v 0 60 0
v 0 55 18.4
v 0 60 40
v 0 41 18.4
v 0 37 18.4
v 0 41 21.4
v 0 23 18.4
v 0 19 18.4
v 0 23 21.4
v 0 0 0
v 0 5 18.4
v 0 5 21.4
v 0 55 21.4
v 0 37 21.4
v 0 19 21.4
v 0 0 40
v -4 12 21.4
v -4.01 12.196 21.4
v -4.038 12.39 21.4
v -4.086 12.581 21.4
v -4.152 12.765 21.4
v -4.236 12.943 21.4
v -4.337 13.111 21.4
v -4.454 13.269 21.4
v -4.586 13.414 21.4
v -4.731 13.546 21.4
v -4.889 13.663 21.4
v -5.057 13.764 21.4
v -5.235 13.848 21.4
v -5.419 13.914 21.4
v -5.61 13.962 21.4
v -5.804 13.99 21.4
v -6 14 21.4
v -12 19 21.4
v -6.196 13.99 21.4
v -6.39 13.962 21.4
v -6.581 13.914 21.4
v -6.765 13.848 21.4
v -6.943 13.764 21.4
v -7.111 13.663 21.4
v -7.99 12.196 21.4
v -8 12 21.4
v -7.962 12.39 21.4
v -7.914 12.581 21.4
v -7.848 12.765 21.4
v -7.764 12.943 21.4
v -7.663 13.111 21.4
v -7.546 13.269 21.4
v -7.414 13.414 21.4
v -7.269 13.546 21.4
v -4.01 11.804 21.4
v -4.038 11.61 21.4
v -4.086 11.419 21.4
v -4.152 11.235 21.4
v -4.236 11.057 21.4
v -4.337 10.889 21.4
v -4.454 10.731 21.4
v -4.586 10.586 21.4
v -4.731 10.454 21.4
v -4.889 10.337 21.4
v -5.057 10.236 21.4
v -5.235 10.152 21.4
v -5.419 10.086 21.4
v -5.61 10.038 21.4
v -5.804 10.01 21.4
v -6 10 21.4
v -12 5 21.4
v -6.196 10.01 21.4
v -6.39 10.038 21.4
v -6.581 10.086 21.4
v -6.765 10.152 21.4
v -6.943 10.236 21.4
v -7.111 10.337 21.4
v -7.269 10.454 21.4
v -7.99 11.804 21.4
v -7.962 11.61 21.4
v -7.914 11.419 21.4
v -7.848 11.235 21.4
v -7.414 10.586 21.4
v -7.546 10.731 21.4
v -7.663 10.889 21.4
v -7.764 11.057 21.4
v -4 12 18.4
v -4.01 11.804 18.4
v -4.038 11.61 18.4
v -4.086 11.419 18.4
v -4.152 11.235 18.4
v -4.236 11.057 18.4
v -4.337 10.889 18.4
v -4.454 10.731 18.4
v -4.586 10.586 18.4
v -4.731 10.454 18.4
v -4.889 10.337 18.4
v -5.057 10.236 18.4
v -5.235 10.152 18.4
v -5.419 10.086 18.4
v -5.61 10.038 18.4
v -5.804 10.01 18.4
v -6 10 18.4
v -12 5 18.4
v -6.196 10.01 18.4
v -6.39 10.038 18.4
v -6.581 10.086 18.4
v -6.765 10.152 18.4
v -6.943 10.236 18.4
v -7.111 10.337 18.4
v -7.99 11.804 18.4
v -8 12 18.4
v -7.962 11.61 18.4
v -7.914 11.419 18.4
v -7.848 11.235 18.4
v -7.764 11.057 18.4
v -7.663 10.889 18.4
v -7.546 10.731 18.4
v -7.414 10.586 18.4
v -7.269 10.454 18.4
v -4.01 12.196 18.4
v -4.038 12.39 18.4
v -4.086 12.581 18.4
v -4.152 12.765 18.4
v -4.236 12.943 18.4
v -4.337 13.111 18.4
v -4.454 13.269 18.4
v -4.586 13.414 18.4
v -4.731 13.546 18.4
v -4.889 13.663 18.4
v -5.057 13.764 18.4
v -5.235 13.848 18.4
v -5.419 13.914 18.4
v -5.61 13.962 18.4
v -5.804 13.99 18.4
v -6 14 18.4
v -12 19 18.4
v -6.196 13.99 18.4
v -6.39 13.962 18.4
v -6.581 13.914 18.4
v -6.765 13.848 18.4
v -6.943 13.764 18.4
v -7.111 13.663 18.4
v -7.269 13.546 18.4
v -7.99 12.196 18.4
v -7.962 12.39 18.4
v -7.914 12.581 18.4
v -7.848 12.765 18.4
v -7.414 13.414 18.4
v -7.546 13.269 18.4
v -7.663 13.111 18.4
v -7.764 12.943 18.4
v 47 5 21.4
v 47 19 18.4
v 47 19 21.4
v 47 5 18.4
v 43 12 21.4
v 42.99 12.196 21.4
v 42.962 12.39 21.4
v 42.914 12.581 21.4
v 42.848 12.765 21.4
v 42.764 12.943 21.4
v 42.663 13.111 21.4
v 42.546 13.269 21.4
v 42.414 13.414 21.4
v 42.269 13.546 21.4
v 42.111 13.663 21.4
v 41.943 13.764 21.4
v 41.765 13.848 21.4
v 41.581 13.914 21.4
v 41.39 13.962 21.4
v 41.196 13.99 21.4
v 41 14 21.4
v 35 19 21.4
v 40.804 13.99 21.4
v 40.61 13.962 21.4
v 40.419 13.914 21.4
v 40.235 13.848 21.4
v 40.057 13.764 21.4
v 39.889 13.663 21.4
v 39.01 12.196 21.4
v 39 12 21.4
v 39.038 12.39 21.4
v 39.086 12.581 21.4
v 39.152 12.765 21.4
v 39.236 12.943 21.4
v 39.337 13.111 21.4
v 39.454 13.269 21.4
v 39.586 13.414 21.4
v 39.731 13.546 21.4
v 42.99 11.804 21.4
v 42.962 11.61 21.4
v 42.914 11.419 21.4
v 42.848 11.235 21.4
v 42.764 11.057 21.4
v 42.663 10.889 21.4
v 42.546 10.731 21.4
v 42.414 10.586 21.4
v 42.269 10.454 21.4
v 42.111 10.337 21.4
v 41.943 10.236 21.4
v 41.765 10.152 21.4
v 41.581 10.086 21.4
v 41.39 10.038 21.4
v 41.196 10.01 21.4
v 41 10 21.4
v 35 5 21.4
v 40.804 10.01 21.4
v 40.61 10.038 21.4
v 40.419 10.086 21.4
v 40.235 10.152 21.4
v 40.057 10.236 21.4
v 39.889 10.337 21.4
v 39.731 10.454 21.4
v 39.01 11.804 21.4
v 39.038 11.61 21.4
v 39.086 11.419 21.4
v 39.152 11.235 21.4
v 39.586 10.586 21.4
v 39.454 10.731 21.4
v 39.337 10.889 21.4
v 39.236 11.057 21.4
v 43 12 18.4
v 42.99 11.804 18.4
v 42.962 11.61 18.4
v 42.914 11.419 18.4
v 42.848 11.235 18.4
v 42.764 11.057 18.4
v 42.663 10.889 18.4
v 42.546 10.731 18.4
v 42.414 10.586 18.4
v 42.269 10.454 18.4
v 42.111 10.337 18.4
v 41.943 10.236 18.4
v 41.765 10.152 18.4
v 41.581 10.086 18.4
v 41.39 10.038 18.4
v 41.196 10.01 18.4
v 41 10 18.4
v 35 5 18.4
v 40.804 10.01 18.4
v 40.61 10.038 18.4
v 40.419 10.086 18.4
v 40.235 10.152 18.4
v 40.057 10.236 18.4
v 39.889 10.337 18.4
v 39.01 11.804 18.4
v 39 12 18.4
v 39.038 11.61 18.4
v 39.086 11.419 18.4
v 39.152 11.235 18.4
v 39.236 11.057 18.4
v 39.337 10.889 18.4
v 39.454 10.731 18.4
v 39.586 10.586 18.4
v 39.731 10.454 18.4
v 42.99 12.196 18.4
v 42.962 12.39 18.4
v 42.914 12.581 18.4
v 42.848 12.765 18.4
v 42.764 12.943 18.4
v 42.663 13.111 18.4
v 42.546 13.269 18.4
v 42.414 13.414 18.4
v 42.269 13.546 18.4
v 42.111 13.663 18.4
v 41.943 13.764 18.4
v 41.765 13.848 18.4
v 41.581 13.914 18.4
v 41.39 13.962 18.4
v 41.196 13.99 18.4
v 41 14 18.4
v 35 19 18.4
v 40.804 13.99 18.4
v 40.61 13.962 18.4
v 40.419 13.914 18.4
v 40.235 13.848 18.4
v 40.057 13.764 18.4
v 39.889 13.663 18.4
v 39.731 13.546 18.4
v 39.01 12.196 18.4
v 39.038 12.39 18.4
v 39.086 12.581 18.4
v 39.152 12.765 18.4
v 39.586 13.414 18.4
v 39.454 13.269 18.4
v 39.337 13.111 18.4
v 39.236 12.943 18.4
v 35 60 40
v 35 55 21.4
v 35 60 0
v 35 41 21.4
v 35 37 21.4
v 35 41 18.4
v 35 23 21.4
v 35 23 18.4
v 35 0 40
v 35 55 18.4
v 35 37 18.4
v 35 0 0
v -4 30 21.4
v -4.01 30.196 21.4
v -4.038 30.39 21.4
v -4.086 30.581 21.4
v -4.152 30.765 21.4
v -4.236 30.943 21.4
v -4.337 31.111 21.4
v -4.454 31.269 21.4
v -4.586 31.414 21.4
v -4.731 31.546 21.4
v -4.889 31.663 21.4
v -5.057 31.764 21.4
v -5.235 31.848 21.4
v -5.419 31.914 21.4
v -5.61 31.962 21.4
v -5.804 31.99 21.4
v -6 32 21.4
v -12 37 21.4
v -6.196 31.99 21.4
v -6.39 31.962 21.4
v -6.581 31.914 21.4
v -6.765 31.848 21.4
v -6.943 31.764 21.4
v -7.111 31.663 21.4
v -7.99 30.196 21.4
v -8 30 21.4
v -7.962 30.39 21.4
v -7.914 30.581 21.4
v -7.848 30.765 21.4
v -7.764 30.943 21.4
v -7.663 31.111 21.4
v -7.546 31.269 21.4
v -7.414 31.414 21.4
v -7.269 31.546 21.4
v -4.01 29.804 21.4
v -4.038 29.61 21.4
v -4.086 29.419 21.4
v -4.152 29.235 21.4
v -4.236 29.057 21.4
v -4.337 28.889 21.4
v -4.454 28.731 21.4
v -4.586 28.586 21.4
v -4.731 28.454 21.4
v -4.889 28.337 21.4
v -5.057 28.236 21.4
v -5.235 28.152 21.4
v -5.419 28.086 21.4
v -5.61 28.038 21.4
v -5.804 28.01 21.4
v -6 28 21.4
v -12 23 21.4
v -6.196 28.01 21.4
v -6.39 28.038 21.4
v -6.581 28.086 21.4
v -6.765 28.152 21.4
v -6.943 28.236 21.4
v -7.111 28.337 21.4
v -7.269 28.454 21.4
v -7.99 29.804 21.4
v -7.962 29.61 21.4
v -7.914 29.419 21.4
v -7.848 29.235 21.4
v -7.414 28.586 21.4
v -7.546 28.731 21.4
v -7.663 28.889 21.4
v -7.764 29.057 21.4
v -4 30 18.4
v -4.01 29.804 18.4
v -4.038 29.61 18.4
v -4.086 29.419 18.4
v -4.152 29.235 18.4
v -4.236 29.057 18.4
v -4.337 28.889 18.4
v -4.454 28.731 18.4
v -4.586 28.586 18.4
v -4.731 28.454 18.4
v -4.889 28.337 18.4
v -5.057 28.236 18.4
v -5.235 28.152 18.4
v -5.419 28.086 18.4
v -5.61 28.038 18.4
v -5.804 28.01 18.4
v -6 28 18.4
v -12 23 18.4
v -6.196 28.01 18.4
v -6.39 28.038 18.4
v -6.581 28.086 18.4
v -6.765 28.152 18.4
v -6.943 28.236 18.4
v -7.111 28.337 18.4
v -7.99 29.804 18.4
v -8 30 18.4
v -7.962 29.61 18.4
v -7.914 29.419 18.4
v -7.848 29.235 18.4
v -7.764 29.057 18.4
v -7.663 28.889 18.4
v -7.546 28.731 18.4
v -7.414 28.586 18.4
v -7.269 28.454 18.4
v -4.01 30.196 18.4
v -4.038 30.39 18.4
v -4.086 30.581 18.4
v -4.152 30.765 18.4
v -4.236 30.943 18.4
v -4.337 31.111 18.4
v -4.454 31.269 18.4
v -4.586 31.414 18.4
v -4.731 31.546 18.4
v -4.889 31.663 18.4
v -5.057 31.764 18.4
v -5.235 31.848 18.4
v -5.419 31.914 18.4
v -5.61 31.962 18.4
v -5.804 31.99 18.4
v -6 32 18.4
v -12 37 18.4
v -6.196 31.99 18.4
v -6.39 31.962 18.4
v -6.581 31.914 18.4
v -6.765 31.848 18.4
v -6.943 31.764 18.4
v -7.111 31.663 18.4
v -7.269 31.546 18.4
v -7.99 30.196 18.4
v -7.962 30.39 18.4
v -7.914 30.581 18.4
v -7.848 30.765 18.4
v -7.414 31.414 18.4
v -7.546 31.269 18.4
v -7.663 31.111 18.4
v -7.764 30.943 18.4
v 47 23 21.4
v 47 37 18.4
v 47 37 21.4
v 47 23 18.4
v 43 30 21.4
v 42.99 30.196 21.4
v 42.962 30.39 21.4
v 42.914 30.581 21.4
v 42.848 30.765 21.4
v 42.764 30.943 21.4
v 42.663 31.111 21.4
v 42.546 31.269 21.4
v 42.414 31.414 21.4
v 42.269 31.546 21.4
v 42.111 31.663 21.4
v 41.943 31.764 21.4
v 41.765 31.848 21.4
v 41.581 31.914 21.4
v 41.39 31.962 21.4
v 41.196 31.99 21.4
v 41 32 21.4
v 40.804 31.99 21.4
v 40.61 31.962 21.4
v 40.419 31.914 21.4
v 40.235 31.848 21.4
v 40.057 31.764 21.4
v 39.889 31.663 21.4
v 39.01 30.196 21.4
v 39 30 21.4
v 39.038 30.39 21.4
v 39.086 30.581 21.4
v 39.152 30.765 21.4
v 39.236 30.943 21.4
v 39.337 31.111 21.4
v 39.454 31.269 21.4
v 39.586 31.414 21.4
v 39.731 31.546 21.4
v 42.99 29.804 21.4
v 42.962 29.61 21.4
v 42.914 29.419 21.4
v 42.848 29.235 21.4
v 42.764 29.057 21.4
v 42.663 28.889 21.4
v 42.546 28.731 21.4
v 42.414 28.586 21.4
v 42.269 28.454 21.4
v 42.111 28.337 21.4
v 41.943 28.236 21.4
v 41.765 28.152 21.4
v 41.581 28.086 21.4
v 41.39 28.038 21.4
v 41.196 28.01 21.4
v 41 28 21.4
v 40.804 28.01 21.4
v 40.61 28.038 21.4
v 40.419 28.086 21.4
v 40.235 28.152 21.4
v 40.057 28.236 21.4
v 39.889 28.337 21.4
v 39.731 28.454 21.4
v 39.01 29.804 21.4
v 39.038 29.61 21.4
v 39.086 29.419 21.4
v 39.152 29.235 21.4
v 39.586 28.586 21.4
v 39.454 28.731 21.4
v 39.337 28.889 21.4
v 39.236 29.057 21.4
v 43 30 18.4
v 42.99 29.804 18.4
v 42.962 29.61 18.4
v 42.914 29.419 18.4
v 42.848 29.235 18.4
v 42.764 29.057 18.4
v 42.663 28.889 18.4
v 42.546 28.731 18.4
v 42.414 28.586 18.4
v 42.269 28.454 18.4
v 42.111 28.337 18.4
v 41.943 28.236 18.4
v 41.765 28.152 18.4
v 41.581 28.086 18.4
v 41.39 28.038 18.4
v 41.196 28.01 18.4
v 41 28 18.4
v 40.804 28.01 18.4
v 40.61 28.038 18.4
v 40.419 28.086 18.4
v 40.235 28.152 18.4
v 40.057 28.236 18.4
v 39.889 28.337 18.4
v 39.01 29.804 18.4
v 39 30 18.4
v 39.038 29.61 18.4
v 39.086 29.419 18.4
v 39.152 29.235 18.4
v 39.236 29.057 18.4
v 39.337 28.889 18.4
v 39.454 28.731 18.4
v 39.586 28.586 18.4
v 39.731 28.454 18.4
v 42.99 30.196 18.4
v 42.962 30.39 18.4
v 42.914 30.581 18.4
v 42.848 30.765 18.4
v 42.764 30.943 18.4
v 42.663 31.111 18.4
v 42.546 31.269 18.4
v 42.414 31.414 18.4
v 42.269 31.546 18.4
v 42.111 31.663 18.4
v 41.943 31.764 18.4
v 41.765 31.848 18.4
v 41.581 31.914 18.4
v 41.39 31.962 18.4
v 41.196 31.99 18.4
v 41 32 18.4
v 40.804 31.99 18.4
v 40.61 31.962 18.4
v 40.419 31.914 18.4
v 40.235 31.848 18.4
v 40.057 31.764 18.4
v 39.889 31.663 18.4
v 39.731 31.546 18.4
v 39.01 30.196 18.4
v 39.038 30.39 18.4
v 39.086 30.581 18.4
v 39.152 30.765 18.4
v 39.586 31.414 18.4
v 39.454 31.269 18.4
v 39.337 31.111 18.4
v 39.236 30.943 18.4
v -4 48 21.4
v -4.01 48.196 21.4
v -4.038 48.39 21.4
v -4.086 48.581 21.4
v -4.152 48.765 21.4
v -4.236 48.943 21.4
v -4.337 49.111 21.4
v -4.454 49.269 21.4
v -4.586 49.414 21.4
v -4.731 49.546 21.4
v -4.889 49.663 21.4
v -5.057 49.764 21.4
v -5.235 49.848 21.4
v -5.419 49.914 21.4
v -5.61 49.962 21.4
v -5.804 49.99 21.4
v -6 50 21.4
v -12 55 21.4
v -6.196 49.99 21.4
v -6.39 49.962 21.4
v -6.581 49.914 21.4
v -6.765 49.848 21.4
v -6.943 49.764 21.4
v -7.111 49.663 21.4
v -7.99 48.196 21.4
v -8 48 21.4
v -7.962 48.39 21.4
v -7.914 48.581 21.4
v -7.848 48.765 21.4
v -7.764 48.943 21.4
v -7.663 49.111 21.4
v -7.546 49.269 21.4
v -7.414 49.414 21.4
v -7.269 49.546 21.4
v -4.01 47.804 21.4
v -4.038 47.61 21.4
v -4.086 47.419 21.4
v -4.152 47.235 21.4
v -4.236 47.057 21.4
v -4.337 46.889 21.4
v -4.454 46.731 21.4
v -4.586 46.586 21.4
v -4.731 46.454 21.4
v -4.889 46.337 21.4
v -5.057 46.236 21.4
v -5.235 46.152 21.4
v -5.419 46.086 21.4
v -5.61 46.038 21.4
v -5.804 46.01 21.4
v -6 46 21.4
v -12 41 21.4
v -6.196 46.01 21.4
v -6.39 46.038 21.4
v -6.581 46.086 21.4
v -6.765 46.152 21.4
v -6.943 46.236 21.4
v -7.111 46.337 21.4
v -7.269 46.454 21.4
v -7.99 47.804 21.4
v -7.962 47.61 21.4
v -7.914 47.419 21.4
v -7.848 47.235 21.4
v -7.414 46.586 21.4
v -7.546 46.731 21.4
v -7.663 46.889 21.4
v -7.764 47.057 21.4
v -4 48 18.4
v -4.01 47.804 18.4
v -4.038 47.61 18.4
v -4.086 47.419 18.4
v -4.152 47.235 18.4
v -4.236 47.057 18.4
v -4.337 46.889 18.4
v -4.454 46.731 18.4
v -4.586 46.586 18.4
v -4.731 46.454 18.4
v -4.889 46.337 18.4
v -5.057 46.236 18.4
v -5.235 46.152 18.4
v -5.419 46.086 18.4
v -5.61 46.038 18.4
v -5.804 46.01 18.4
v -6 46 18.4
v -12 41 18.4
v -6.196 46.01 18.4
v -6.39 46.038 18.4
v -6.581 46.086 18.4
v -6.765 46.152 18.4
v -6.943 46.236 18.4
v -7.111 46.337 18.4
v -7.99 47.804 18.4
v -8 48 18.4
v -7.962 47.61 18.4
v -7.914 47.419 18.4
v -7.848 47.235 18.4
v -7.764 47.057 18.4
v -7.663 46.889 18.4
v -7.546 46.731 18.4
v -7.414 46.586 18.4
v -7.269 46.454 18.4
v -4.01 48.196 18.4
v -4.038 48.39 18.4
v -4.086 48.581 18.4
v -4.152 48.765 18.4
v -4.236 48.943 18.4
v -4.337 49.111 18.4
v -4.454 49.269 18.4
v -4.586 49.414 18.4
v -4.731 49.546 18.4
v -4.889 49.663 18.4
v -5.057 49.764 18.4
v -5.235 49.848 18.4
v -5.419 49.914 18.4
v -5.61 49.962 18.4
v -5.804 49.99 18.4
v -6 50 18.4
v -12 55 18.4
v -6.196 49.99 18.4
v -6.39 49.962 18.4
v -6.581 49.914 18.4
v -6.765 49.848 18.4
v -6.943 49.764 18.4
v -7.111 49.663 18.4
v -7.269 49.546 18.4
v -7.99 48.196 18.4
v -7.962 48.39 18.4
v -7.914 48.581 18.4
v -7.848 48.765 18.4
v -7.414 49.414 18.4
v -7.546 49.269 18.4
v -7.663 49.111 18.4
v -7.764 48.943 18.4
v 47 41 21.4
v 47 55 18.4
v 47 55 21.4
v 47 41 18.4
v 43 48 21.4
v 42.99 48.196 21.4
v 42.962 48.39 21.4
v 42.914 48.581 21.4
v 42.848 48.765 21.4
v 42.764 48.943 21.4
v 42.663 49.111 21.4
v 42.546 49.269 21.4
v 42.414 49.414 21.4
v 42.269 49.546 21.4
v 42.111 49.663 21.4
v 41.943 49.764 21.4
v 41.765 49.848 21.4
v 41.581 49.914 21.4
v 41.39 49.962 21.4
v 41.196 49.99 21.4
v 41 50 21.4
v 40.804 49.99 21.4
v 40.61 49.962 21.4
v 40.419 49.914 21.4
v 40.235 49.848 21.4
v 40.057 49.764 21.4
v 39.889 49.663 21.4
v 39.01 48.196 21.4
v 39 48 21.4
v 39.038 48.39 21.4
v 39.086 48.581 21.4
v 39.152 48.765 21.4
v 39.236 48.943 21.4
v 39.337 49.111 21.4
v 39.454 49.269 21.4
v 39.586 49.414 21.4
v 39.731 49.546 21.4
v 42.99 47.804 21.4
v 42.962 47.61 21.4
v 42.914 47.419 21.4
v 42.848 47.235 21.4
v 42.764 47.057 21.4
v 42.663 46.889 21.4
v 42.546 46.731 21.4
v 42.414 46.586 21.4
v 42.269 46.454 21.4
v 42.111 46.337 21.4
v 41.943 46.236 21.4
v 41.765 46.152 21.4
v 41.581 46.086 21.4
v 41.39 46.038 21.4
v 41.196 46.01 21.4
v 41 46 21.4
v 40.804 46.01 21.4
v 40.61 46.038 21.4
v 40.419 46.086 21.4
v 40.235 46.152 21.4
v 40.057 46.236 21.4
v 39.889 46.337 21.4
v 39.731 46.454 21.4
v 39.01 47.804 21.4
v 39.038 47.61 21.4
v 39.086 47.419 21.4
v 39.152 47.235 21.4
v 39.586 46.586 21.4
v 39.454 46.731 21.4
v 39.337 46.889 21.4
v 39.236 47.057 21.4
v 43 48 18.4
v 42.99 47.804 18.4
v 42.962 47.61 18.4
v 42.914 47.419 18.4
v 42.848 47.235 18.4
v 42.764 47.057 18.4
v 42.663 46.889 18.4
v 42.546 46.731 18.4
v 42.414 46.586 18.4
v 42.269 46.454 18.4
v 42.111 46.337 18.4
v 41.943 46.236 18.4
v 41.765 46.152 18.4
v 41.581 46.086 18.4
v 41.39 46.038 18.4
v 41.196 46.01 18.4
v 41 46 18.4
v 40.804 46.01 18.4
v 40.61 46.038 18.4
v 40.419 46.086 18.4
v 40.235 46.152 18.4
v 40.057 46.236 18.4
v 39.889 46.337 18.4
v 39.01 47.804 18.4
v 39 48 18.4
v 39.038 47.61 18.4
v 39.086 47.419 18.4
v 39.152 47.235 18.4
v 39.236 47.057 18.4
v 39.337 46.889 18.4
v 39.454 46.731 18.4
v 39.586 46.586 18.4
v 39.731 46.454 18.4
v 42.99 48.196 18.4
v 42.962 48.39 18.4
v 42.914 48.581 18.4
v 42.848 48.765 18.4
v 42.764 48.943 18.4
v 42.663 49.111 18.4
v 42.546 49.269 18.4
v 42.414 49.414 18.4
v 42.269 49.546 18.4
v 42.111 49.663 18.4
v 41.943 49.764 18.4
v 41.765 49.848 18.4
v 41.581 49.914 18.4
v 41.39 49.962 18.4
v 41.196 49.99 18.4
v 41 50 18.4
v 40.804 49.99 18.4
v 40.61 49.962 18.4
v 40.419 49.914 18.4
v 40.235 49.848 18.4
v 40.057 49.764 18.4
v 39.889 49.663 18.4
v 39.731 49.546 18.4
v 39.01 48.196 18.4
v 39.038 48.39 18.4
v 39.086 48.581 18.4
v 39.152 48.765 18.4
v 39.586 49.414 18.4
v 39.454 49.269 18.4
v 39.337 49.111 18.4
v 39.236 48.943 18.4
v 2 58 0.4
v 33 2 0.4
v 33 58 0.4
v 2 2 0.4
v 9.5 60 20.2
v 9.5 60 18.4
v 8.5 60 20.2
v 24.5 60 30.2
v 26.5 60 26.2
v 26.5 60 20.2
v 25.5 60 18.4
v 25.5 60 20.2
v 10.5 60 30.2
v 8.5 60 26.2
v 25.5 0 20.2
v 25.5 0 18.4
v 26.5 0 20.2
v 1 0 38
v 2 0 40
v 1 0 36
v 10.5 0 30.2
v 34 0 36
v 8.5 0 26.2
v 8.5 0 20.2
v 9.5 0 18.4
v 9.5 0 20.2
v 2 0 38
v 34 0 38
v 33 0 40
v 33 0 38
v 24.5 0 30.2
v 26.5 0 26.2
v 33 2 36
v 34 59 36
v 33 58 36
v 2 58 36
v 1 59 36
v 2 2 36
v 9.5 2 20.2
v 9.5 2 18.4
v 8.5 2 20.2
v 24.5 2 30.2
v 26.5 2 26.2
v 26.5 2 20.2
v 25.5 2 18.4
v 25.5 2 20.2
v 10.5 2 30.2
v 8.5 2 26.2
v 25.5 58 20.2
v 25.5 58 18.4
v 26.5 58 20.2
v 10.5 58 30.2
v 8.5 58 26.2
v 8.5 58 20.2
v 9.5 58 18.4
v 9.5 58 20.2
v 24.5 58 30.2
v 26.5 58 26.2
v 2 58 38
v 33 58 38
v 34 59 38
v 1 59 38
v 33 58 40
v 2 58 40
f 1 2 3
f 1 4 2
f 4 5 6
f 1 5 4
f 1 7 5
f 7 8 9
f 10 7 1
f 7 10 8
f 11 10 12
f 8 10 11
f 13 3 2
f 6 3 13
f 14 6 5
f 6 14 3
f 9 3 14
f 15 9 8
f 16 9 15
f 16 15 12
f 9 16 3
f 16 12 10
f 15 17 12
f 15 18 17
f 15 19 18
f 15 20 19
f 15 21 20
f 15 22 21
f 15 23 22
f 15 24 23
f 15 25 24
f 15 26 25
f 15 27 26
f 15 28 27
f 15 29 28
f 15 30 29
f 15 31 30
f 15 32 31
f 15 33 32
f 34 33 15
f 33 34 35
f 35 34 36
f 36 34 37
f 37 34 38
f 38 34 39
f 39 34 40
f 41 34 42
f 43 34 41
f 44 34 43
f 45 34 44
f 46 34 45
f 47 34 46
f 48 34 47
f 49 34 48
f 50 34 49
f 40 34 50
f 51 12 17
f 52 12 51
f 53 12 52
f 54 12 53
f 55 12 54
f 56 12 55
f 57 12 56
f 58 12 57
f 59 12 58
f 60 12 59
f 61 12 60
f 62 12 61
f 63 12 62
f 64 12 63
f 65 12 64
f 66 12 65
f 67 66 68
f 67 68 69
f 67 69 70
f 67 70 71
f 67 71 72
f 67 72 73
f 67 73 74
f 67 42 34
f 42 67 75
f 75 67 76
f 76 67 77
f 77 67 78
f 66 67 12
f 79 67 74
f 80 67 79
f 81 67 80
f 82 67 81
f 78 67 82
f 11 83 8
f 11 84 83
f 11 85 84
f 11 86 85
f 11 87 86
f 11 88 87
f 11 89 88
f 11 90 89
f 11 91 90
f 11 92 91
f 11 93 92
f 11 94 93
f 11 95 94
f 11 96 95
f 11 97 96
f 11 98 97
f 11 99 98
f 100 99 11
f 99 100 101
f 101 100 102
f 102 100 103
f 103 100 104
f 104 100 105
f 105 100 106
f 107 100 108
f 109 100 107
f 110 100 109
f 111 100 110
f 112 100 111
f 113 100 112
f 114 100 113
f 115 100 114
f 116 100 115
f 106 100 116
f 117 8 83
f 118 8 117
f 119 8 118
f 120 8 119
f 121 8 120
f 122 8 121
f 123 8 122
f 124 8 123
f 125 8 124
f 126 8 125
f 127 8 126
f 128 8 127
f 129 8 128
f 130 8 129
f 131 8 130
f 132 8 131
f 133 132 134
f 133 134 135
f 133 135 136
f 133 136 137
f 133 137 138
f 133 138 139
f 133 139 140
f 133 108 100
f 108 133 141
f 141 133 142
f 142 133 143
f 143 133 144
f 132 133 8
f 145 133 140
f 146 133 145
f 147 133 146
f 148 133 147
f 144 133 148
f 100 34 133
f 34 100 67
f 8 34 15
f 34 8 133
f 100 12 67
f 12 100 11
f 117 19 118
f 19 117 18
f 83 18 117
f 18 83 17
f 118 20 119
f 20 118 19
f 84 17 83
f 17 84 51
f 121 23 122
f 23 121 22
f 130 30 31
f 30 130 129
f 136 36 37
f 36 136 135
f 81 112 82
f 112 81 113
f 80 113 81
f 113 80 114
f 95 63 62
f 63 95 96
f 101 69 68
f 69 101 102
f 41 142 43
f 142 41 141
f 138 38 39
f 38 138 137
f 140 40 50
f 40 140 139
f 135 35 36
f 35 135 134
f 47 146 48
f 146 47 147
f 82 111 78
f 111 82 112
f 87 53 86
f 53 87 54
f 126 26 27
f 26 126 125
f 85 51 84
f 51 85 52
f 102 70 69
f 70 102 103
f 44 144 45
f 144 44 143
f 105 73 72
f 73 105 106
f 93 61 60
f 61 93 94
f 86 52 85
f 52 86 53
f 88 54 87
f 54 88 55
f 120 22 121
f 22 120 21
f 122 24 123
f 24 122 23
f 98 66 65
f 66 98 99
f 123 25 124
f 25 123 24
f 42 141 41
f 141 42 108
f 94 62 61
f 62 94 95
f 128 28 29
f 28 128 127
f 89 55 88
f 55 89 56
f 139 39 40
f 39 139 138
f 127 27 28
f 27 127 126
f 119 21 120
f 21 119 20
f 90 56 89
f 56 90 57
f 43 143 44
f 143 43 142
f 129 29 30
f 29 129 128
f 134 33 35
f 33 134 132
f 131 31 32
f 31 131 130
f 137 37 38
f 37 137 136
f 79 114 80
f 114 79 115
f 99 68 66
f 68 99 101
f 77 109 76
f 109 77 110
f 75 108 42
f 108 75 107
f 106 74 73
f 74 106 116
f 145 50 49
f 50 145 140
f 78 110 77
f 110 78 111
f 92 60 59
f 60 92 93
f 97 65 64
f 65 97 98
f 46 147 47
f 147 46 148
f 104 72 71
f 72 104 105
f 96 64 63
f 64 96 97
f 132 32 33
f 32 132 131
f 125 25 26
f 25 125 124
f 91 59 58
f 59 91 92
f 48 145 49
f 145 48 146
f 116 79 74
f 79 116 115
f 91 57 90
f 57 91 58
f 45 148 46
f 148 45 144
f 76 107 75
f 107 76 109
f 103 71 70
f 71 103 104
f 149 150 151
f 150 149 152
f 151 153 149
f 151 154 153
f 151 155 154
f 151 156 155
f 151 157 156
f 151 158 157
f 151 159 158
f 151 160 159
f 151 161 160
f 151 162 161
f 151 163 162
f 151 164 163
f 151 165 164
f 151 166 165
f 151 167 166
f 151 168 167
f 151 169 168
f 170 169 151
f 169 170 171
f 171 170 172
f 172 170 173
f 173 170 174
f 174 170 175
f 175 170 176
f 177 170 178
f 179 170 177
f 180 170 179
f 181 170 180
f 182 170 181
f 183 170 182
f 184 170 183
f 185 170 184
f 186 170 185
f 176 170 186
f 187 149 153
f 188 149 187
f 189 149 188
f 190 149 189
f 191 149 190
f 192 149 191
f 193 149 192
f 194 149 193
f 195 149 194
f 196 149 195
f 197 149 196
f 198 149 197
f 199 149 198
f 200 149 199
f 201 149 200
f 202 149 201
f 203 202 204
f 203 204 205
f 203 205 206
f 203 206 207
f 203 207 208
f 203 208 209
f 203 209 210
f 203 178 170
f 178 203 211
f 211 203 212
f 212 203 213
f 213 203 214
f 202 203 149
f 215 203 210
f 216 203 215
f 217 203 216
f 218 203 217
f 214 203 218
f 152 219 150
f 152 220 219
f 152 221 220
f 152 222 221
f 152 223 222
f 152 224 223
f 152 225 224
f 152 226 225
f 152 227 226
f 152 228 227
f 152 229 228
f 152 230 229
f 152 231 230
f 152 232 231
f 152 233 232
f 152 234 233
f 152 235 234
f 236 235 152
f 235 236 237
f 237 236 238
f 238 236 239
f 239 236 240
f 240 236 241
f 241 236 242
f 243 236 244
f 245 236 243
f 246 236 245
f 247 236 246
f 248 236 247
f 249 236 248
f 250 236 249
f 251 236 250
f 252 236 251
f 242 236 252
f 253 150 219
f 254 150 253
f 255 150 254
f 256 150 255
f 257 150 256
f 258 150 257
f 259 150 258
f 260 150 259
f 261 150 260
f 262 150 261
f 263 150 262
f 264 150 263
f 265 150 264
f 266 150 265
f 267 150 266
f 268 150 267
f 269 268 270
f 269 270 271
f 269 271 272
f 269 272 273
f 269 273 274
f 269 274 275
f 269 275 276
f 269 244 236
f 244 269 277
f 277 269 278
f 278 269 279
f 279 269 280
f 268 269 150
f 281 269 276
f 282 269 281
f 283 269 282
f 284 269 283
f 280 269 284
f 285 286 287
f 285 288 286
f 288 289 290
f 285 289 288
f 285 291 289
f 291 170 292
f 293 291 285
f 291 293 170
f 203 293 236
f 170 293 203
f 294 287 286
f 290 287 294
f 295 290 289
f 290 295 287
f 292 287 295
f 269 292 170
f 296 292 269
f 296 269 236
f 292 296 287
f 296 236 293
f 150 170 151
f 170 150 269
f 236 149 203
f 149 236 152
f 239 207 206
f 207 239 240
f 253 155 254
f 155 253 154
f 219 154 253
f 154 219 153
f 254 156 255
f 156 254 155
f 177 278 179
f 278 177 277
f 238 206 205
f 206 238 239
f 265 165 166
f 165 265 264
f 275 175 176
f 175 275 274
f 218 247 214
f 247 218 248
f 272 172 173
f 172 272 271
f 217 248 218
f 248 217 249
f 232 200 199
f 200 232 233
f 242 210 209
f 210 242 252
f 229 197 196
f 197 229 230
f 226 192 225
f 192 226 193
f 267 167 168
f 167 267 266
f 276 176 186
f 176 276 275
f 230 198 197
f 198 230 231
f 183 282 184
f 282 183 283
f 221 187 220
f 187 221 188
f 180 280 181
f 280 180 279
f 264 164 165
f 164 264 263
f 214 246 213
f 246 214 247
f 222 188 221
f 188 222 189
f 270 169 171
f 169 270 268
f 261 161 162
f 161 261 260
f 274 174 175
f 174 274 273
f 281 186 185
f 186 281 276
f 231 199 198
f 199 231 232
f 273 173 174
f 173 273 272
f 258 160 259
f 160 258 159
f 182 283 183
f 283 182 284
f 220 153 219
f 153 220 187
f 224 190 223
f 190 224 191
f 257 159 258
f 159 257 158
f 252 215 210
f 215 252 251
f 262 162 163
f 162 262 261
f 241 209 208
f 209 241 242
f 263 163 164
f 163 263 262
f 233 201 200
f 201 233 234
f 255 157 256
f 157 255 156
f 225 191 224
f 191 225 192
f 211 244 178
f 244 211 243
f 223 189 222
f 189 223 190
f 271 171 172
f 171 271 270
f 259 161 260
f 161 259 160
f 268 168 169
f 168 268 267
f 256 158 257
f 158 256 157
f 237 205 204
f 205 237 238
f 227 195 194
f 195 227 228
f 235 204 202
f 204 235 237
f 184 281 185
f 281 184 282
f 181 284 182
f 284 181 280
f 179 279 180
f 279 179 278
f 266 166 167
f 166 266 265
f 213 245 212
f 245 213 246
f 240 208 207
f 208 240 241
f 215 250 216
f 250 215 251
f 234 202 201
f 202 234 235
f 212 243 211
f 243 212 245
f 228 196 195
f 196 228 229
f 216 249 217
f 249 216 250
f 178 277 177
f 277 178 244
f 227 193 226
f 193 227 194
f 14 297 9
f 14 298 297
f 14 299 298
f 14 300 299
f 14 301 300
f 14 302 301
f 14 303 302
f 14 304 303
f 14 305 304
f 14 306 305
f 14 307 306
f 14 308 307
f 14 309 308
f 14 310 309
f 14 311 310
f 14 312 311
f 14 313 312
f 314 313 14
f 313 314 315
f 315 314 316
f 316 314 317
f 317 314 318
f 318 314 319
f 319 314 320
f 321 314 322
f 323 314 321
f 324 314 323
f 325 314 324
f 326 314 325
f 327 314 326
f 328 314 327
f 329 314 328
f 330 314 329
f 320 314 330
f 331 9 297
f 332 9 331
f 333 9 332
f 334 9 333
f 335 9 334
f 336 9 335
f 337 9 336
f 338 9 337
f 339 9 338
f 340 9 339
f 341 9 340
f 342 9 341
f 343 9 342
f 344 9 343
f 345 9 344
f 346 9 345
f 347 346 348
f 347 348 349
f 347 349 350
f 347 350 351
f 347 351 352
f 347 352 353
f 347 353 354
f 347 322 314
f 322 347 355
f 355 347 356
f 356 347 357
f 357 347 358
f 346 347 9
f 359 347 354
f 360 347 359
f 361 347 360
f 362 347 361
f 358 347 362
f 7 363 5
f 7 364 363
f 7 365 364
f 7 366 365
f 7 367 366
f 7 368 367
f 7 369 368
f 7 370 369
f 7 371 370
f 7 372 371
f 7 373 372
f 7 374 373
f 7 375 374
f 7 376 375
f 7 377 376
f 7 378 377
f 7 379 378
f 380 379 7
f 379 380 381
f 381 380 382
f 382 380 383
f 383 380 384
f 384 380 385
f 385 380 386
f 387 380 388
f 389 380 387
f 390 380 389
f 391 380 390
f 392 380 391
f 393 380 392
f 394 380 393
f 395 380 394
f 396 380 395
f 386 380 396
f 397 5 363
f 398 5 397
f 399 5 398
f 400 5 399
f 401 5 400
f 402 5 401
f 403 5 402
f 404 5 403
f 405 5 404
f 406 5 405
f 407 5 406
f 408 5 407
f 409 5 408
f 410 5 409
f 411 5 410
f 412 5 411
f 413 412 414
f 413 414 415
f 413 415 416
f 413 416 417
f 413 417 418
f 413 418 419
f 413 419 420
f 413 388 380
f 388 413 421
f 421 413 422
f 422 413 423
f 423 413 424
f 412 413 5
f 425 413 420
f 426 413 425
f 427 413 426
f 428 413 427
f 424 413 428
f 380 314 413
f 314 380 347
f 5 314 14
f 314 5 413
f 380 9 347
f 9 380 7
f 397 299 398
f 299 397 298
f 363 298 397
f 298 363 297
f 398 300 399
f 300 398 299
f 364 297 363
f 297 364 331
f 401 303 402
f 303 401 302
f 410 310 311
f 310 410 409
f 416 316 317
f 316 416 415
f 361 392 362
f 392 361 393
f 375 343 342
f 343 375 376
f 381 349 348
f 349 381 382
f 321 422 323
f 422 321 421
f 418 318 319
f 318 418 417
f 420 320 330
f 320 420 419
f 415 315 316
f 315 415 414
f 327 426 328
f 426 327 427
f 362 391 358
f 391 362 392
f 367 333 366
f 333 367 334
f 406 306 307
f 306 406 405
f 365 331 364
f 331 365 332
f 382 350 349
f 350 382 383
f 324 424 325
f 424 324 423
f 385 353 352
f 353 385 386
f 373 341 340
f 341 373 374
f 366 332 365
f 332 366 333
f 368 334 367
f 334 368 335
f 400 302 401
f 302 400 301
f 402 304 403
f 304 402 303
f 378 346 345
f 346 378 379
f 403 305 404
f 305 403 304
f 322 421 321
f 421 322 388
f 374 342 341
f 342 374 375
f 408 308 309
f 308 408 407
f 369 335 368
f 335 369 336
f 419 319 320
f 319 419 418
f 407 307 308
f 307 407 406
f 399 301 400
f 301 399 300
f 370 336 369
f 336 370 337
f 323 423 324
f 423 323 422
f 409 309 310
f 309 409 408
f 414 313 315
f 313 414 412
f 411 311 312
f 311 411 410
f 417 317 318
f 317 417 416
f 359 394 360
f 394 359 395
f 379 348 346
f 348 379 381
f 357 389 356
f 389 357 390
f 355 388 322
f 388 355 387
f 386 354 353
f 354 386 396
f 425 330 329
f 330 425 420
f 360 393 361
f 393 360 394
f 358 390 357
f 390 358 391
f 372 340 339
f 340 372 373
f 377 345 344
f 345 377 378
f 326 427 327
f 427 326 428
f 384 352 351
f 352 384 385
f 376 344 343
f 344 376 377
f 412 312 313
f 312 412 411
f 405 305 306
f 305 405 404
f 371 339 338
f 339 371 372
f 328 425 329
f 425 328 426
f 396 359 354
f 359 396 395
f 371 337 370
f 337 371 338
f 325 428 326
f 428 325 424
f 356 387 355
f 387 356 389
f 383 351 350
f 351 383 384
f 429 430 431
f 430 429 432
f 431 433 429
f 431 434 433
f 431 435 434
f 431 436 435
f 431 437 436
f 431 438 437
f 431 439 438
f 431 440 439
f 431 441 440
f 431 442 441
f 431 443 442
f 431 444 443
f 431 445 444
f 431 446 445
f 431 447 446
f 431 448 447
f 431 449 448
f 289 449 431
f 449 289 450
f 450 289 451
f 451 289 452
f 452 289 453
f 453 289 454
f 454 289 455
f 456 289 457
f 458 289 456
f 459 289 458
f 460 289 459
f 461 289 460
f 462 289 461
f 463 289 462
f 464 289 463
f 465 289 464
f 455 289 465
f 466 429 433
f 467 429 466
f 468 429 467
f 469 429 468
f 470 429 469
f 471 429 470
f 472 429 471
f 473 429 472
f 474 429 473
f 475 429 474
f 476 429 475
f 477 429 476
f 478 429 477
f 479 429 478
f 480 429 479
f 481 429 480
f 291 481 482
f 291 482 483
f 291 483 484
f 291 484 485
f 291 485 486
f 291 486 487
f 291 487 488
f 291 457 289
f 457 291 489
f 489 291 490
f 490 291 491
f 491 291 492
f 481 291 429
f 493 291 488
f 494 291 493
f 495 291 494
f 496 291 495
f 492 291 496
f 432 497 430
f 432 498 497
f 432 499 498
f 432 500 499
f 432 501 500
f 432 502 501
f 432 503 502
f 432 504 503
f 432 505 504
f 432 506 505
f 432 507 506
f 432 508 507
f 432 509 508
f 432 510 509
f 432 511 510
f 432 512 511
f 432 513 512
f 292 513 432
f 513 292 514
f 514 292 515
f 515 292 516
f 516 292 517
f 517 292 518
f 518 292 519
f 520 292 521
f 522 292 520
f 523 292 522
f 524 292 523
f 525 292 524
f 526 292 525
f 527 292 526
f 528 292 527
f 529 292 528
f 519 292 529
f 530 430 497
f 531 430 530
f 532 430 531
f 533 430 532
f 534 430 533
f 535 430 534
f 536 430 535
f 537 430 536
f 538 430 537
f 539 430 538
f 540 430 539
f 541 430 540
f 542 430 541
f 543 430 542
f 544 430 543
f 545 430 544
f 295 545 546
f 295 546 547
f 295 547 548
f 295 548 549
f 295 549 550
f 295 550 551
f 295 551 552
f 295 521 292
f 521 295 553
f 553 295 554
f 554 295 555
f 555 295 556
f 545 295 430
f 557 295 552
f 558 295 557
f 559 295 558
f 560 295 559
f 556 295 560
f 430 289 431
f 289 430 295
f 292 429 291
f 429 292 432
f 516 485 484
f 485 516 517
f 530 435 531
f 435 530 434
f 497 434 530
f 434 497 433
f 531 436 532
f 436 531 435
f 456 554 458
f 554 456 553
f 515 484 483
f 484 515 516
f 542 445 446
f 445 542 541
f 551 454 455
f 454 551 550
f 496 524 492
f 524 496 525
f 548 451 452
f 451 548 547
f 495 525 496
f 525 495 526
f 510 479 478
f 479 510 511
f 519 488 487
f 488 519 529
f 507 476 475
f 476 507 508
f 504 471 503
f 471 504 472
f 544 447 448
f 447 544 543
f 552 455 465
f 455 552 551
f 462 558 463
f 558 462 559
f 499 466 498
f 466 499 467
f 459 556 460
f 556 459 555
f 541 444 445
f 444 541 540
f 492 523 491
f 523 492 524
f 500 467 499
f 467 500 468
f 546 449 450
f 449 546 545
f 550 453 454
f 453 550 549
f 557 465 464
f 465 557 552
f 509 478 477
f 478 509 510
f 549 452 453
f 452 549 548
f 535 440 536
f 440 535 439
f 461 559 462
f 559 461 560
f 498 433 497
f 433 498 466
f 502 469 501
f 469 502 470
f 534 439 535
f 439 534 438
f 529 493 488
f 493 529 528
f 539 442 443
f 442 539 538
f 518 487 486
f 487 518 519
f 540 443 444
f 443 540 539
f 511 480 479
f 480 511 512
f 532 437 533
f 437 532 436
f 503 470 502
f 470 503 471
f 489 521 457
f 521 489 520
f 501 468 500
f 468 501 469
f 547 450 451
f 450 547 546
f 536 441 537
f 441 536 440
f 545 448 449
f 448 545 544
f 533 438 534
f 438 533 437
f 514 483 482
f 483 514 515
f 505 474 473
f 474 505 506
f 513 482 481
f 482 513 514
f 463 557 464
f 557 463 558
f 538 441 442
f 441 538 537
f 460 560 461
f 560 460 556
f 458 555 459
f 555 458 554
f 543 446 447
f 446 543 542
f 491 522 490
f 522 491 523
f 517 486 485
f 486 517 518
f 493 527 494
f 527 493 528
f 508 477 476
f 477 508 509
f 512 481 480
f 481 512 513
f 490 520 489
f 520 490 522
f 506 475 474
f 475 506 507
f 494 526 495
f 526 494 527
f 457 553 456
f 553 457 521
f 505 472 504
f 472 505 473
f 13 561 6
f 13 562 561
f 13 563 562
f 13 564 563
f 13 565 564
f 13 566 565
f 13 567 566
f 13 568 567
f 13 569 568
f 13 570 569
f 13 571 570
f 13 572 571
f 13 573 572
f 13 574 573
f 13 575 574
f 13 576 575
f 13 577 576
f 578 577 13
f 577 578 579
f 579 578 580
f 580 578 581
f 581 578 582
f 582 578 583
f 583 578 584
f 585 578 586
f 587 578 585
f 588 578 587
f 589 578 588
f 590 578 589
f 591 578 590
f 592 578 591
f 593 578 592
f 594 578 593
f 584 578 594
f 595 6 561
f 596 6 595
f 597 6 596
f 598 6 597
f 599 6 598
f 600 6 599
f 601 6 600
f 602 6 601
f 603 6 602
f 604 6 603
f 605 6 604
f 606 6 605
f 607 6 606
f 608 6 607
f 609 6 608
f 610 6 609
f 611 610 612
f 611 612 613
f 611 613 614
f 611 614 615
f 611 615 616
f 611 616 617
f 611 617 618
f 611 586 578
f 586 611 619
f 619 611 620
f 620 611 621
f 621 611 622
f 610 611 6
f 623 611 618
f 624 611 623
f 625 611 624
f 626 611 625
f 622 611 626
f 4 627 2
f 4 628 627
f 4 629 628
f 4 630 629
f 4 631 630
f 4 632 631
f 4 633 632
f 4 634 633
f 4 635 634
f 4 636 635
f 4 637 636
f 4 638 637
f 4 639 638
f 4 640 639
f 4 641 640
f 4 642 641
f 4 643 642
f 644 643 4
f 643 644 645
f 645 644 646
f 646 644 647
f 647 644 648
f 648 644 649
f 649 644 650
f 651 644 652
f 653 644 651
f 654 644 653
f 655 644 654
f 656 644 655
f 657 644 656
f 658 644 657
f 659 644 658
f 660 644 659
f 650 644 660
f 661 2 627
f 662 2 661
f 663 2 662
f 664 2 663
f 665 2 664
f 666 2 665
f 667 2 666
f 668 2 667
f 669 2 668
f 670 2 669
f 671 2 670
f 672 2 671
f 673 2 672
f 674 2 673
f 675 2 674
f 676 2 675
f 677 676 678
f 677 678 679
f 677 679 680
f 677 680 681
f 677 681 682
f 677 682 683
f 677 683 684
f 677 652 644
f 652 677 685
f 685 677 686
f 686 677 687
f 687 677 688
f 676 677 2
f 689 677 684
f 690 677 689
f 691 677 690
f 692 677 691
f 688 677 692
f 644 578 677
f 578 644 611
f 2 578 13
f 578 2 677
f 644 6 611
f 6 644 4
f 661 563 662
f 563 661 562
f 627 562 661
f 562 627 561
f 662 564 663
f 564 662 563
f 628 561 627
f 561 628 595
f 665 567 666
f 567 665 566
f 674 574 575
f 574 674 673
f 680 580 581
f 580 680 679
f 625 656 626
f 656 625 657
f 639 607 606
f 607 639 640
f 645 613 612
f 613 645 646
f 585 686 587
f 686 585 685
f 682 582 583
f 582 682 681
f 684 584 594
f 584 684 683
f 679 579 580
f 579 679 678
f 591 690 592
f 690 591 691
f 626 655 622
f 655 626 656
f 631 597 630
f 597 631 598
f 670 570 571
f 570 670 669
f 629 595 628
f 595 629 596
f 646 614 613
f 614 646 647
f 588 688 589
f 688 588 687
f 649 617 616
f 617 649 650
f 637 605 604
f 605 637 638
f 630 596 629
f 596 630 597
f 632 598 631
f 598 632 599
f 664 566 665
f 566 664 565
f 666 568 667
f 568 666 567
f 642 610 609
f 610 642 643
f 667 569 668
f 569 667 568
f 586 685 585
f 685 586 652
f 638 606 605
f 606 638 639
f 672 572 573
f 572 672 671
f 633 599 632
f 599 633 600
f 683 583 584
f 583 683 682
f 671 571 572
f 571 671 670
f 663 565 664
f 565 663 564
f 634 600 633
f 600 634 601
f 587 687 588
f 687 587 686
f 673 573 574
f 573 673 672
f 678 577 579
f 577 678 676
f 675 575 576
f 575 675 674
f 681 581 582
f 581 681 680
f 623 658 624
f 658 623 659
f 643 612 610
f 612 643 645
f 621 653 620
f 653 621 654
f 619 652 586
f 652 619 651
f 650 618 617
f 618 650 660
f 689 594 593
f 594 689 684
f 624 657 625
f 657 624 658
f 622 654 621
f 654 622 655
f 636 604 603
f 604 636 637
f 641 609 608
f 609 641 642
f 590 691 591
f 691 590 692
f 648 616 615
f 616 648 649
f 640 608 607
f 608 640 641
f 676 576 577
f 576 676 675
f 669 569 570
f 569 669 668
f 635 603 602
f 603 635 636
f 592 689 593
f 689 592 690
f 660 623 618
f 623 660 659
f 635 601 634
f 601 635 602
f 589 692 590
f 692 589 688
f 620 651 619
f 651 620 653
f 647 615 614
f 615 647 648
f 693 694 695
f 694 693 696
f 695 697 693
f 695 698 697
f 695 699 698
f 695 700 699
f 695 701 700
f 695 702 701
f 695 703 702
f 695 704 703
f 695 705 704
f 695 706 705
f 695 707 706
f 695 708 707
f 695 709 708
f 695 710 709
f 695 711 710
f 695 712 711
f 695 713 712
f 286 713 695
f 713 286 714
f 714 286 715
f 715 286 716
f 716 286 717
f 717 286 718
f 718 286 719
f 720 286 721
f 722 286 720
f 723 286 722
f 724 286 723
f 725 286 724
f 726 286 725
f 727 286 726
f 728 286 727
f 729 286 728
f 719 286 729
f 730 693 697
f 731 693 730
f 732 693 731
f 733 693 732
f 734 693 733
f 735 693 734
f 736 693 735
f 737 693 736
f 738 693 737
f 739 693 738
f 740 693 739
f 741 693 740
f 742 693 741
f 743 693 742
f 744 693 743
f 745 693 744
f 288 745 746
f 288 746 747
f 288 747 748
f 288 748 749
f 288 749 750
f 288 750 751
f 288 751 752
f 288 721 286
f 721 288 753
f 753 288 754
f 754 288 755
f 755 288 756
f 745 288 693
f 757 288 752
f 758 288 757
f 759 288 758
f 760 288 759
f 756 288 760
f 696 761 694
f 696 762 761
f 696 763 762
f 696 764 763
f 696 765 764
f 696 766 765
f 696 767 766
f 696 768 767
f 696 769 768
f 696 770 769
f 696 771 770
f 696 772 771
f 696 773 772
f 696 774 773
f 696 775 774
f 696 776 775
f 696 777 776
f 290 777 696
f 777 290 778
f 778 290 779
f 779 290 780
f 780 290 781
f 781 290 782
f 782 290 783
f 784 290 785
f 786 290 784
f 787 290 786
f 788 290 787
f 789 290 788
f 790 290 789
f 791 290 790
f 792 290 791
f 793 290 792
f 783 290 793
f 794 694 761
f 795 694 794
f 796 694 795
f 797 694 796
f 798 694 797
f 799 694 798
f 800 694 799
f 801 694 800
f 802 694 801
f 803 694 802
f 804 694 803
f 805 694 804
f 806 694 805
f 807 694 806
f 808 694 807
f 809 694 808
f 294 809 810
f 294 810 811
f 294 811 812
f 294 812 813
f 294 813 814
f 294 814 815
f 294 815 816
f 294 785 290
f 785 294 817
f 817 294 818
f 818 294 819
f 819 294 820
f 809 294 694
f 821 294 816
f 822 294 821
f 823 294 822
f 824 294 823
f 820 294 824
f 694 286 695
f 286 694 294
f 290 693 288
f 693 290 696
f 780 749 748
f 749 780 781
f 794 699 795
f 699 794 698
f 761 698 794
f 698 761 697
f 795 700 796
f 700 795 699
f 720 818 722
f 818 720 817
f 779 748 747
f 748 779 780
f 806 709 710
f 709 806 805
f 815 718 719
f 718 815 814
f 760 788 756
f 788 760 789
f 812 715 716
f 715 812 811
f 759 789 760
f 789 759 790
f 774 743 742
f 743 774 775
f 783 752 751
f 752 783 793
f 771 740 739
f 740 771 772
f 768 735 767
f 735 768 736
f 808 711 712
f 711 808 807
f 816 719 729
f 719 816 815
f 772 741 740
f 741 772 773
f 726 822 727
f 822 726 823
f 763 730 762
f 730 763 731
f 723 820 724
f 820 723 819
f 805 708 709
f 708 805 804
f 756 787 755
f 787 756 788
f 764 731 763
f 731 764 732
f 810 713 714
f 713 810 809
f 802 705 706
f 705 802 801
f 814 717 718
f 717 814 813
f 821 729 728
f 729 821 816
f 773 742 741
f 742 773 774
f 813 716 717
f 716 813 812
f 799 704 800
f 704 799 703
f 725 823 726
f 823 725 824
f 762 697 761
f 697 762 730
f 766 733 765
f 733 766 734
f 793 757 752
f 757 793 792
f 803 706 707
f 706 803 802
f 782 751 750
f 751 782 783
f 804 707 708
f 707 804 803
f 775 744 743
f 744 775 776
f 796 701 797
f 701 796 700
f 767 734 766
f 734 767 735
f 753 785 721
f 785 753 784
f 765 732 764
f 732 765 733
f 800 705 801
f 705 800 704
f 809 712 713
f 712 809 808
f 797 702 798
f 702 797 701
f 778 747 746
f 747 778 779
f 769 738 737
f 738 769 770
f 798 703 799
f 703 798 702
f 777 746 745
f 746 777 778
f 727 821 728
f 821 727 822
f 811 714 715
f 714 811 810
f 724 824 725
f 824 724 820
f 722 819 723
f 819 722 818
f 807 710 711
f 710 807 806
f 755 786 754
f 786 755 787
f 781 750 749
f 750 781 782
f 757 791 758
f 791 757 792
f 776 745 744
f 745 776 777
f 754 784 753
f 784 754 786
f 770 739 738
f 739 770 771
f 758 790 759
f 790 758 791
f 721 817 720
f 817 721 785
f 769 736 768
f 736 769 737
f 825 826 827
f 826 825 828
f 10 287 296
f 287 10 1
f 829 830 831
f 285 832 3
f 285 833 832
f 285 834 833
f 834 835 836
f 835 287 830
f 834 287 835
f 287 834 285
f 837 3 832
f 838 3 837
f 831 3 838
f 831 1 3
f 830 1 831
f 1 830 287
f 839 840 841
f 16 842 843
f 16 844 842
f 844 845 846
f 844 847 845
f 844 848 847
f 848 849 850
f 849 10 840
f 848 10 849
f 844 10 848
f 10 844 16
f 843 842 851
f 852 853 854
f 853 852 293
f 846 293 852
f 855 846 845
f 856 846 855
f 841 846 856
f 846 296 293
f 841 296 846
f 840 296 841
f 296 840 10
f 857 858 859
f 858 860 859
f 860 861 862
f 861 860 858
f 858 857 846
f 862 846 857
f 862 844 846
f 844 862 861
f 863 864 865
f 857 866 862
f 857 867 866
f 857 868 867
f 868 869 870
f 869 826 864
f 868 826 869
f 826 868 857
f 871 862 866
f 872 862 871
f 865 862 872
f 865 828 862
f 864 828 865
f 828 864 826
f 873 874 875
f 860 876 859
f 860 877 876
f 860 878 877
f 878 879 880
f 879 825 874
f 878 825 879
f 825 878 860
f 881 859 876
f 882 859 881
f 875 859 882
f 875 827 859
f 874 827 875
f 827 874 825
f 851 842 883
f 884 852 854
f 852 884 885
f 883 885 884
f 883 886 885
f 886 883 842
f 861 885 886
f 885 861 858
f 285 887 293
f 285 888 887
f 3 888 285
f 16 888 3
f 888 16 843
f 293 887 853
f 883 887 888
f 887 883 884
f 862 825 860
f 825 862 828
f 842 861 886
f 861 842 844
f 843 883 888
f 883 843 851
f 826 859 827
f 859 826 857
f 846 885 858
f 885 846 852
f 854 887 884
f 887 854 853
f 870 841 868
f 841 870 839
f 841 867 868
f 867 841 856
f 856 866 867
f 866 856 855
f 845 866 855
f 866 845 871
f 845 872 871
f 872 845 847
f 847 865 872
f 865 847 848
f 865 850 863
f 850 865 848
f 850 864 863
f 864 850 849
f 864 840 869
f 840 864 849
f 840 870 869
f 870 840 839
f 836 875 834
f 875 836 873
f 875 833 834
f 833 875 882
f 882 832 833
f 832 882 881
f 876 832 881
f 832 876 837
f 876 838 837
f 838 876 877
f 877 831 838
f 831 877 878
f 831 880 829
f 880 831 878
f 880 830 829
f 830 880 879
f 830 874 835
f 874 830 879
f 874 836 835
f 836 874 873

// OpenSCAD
/*
CAIXA PARA COLMEIA — versão sem tampa
Medidas em milímetros.

Modelo:
- Caixa aberta em cima
- Altura: 40 mm
- Fundo fino: 0,4 mm
- Parede: 2 mm
- Canaleta interna para tampa deslizante
- Entrada da canaleta aberta na parede da frente
- 6 presilhas laterais com furos para parafuso
- Furo poligonal na parede da frente e na parede de trás
*/

$fn = 64;

epsilon = 0.02;

// =========================
// MEDIDAS PRINCIPAIS
// =========================
largura_caixa      = 35;     // eixo X
comprimento_caixa  = 60;     // eixo Y
altura_caixa       = 40;     // eixo Z

espessura_parede   = 2;
espessura_fundo    = 0.4;

// =========================
// CANALETA DA TAMPA
// =========================
altura_canaleta    = 36;     // onde começa a canaleta
canaleta_altura    = 2;      // altura da canaleta
canaleta_profund   = 1;      // profundidade da canaleta na parede

// =========================
// PRESILHAS
// =========================
entrada_colmeia    = 18.4;   // parte que entra na madeira da colmeia
presilha_extensao  = 12;     // quanto a presilha sai para fora da caixa
presilha_largura_y = 14;     // tamanho da presilha no comprimento da caixa
presilha_espessura = 3;      // espessura vertical da presilha
furo_parafuso      = 4;      // diâmetro do furo

// posições das 3 presilhas em cada lado
posicoes_presilhas_y = [5, 23, 41];


// =========================
// FURO POLIGONAL NA FRENTE E ATRÁS
// =========================

// Altura da base inferior do polígono em relação ao fundo da caixa
furo_base_z = 18.4;

// Posição horizontal do centro do furo na parede da frente
furo_centro_x = largura_caixa / 2;

// Medidas do polígono
furo_base_largura = 16;
furo_topo_largura = 14;

furo_vertical_baixo = 1.8;
furo_degrau_horizontal = 1;
furo_vertical_meio = 6;
furo_obliquo_altura = 4;

// Para que a base seja 16 mm e o topo seja 14 mm,
// com o degrau horizontal de 1 mm para fora,
// o deslocamento horizontal do trecho oblíquo precisa ser 2 mm.
furo_obliquo_dx =
    (furo_base_largura + 2 * furo_degrau_horizontal - furo_topo_largura) / 2;


// =========================
// MÓDULO DO FURO POLIGONAL
// =========================
module furo_poligonal_frente() {

    b = furo_base_largura / 2;

    z1 = furo_vertical_baixo;
    z2 = furo_vertical_baixo + furo_vertical_meio;
    z3 = furo_vertical_baixo + furo_vertical_meio + furo_obliquo_altura;

    x_base = b;
    x_externo = b + furo_degrau_horizontal;
    x_topo = x_externo - furo_obliquo_dx;

    pontos = [
        [-x_base,   0],
        [ x_base,   0],

        [ x_base,   z1],
        [ x_externo, z1],
        [ x_externo, z2],
        [ x_topo,   z3],

        [-x_topo,   z3],
        [-x_externo, z2],
        [-x_externo, z1],
        [-x_base,   z1]
    ];

    translate([
        furo_centro_x,
        espessura_parede + epsilon,
        furo_base_z
    ])
        rotate([90, 0, 0])
            linear_extrude(height = espessura_parede + 2 * epsilon)
                polygon(points = pontos);
}


module furo_poligonal_tras() {

    b = furo_base_largura / 2;

    z1 = furo_vertical_baixo;
    z2 = furo_vertical_baixo + furo_vertical_meio;
    z3 = furo_vertical_baixo + furo_vertical_meio + furo_obliquo_altura;

    x_base = b;
    x_externo = b + furo_degrau_horizontal;
    x_topo = x_externo - furo_obliquo_dx;

    pontos = [
        [-x_base,   0],
        [ x_base,   0],

        [ x_base,   z1],
        [ x_externo, z1],
        [ x_externo, z2],
        [ x_topo,   z3],

        [-x_topo,   z3],
        [-x_externo, z2],
        [-x_externo, z1],
        [-x_base,   z1]
    ];

    translate([
        furo_centro_x,
        comprimento_caixa + epsilon,
        furo_base_z
    ])
        rotate([90, 0, 0])
            linear_extrude(height = espessura_parede + 2 * epsilon)
                polygon(points = pontos);
}


// =========================
// CORPO DA CAIXA SEM FURO
// =========================
module corpo_caixa_colmeia() {
    union() {

        // Fundo fino
        cube([largura_caixa, comprimento_caixa, espessura_fundo]);

        // Parede da frente
        // Ela para antes da canaleta para deixar a entrada da tampa aberta.
        cube([largura_caixa, espessura_parede, altura_canaleta]);

        // Parede de trás — parte inferior
        translate([0, comprimento_caixa - espessura_parede, 0])
            cube([largura_caixa, espessura_parede, altura_canaleta]);

        // Parede de trás — parte da canaleta
        translate([0, comprimento_caixa - canaleta_profund, altura_canaleta])
            cube([largura_caixa, canaleta_profund, canaleta_altura]);

        // Parede de trás — parte superior
        translate([0, comprimento_caixa - espessura_parede, altura_canaleta + canaleta_altura])
            cube([
                largura_caixa,
                espessura_parede,
                altura_caixa - altura_canaleta - canaleta_altura
            ]);

        // Parede lateral esquerda — parte inferior
        cube([espessura_parede, comprimento_caixa, altura_canaleta]);

        // Parede lateral esquerda — parte da canaleta
        translate([0, 0, altura_canaleta])
            cube([canaleta_profund, comprimento_caixa, canaleta_altura]);

        // Parede lateral esquerda — parte superior
        translate([0, 0, altura_canaleta + canaleta_altura])
            cube([
                espessura_parede,
                comprimento_caixa,
                altura_caixa - altura_canaleta - canaleta_altura
            ]);

        // Parede lateral direita — parte inferior
        translate([largura_caixa - espessura_parede, 0, 0])
            cube([espessura_parede, comprimento_caixa, altura_canaleta]);

        // Parede lateral direita — parte da canaleta
        translate([largura_caixa - canaleta_profund, 0, altura_canaleta])
            cube([canaleta_profund, comprimento_caixa, canaleta_altura]);

        // Parede lateral direita — parte superior
        translate([largura_caixa - espessura_parede, 0, altura_canaleta + canaleta_altura])
            cube([
                espessura_parede,
                comprimento_caixa,
                altura_caixa - altura_canaleta - canaleta_altura
            ]);

        // Presilhas laterais
        for (ypos = posicoes_presilhas_y) {
            presilha_esquerda(ypos);
            presilha_direita(ypos);
        }
    }
}


// =========================
// CAIXA COM FUROS
// =========================
module caixa_colmeia() {
    difference() {
        corpo_caixa_colmeia();

        // Furo na parede da frente, na face y = 0
        furo_poligonal_frente();

        // Furo na parede de trás, na face y = comprimento_caixa
        furo_poligonal_tras();
    }
}


// =========================
// PRESILHA ESQUERDA
// =========================
module presilha_esquerda(ypos) {
    difference() {
        translate([-presilha_extensao, ypos, entrada_colmeia])
            cube([
                presilha_extensao,
                presilha_largura_y,
                presilha_espessura
            ]);

        translate([
            -presilha_extensao / 2,
            ypos + presilha_largura_y / 2,
            entrada_colmeia - 0.5
        ])
            cylinder(
                h = presilha_espessura + 1,
                d = furo_parafuso
            );
    }
}


// =========================
// PRESILHA DIREITA
// =========================
module presilha_direita(ypos) {
    difference() {
        translate([largura_caixa, ypos, entrada_colmeia])
            cube([
                presilha_extensao,
                presilha_largura_y,
                presilha_espessura
            ]);

        translate([
            largura_caixa + presilha_extensao / 2,
            ypos + presilha_largura_y / 2,
            entrada_colmeia - 0.5
        ])
            cylinder(
                h = presilha_espessura + 1,
                d = furo_parafuso
            );
    }
}


// =========================
// GERAR MODELO
// =========================
caixa_colmeia();
